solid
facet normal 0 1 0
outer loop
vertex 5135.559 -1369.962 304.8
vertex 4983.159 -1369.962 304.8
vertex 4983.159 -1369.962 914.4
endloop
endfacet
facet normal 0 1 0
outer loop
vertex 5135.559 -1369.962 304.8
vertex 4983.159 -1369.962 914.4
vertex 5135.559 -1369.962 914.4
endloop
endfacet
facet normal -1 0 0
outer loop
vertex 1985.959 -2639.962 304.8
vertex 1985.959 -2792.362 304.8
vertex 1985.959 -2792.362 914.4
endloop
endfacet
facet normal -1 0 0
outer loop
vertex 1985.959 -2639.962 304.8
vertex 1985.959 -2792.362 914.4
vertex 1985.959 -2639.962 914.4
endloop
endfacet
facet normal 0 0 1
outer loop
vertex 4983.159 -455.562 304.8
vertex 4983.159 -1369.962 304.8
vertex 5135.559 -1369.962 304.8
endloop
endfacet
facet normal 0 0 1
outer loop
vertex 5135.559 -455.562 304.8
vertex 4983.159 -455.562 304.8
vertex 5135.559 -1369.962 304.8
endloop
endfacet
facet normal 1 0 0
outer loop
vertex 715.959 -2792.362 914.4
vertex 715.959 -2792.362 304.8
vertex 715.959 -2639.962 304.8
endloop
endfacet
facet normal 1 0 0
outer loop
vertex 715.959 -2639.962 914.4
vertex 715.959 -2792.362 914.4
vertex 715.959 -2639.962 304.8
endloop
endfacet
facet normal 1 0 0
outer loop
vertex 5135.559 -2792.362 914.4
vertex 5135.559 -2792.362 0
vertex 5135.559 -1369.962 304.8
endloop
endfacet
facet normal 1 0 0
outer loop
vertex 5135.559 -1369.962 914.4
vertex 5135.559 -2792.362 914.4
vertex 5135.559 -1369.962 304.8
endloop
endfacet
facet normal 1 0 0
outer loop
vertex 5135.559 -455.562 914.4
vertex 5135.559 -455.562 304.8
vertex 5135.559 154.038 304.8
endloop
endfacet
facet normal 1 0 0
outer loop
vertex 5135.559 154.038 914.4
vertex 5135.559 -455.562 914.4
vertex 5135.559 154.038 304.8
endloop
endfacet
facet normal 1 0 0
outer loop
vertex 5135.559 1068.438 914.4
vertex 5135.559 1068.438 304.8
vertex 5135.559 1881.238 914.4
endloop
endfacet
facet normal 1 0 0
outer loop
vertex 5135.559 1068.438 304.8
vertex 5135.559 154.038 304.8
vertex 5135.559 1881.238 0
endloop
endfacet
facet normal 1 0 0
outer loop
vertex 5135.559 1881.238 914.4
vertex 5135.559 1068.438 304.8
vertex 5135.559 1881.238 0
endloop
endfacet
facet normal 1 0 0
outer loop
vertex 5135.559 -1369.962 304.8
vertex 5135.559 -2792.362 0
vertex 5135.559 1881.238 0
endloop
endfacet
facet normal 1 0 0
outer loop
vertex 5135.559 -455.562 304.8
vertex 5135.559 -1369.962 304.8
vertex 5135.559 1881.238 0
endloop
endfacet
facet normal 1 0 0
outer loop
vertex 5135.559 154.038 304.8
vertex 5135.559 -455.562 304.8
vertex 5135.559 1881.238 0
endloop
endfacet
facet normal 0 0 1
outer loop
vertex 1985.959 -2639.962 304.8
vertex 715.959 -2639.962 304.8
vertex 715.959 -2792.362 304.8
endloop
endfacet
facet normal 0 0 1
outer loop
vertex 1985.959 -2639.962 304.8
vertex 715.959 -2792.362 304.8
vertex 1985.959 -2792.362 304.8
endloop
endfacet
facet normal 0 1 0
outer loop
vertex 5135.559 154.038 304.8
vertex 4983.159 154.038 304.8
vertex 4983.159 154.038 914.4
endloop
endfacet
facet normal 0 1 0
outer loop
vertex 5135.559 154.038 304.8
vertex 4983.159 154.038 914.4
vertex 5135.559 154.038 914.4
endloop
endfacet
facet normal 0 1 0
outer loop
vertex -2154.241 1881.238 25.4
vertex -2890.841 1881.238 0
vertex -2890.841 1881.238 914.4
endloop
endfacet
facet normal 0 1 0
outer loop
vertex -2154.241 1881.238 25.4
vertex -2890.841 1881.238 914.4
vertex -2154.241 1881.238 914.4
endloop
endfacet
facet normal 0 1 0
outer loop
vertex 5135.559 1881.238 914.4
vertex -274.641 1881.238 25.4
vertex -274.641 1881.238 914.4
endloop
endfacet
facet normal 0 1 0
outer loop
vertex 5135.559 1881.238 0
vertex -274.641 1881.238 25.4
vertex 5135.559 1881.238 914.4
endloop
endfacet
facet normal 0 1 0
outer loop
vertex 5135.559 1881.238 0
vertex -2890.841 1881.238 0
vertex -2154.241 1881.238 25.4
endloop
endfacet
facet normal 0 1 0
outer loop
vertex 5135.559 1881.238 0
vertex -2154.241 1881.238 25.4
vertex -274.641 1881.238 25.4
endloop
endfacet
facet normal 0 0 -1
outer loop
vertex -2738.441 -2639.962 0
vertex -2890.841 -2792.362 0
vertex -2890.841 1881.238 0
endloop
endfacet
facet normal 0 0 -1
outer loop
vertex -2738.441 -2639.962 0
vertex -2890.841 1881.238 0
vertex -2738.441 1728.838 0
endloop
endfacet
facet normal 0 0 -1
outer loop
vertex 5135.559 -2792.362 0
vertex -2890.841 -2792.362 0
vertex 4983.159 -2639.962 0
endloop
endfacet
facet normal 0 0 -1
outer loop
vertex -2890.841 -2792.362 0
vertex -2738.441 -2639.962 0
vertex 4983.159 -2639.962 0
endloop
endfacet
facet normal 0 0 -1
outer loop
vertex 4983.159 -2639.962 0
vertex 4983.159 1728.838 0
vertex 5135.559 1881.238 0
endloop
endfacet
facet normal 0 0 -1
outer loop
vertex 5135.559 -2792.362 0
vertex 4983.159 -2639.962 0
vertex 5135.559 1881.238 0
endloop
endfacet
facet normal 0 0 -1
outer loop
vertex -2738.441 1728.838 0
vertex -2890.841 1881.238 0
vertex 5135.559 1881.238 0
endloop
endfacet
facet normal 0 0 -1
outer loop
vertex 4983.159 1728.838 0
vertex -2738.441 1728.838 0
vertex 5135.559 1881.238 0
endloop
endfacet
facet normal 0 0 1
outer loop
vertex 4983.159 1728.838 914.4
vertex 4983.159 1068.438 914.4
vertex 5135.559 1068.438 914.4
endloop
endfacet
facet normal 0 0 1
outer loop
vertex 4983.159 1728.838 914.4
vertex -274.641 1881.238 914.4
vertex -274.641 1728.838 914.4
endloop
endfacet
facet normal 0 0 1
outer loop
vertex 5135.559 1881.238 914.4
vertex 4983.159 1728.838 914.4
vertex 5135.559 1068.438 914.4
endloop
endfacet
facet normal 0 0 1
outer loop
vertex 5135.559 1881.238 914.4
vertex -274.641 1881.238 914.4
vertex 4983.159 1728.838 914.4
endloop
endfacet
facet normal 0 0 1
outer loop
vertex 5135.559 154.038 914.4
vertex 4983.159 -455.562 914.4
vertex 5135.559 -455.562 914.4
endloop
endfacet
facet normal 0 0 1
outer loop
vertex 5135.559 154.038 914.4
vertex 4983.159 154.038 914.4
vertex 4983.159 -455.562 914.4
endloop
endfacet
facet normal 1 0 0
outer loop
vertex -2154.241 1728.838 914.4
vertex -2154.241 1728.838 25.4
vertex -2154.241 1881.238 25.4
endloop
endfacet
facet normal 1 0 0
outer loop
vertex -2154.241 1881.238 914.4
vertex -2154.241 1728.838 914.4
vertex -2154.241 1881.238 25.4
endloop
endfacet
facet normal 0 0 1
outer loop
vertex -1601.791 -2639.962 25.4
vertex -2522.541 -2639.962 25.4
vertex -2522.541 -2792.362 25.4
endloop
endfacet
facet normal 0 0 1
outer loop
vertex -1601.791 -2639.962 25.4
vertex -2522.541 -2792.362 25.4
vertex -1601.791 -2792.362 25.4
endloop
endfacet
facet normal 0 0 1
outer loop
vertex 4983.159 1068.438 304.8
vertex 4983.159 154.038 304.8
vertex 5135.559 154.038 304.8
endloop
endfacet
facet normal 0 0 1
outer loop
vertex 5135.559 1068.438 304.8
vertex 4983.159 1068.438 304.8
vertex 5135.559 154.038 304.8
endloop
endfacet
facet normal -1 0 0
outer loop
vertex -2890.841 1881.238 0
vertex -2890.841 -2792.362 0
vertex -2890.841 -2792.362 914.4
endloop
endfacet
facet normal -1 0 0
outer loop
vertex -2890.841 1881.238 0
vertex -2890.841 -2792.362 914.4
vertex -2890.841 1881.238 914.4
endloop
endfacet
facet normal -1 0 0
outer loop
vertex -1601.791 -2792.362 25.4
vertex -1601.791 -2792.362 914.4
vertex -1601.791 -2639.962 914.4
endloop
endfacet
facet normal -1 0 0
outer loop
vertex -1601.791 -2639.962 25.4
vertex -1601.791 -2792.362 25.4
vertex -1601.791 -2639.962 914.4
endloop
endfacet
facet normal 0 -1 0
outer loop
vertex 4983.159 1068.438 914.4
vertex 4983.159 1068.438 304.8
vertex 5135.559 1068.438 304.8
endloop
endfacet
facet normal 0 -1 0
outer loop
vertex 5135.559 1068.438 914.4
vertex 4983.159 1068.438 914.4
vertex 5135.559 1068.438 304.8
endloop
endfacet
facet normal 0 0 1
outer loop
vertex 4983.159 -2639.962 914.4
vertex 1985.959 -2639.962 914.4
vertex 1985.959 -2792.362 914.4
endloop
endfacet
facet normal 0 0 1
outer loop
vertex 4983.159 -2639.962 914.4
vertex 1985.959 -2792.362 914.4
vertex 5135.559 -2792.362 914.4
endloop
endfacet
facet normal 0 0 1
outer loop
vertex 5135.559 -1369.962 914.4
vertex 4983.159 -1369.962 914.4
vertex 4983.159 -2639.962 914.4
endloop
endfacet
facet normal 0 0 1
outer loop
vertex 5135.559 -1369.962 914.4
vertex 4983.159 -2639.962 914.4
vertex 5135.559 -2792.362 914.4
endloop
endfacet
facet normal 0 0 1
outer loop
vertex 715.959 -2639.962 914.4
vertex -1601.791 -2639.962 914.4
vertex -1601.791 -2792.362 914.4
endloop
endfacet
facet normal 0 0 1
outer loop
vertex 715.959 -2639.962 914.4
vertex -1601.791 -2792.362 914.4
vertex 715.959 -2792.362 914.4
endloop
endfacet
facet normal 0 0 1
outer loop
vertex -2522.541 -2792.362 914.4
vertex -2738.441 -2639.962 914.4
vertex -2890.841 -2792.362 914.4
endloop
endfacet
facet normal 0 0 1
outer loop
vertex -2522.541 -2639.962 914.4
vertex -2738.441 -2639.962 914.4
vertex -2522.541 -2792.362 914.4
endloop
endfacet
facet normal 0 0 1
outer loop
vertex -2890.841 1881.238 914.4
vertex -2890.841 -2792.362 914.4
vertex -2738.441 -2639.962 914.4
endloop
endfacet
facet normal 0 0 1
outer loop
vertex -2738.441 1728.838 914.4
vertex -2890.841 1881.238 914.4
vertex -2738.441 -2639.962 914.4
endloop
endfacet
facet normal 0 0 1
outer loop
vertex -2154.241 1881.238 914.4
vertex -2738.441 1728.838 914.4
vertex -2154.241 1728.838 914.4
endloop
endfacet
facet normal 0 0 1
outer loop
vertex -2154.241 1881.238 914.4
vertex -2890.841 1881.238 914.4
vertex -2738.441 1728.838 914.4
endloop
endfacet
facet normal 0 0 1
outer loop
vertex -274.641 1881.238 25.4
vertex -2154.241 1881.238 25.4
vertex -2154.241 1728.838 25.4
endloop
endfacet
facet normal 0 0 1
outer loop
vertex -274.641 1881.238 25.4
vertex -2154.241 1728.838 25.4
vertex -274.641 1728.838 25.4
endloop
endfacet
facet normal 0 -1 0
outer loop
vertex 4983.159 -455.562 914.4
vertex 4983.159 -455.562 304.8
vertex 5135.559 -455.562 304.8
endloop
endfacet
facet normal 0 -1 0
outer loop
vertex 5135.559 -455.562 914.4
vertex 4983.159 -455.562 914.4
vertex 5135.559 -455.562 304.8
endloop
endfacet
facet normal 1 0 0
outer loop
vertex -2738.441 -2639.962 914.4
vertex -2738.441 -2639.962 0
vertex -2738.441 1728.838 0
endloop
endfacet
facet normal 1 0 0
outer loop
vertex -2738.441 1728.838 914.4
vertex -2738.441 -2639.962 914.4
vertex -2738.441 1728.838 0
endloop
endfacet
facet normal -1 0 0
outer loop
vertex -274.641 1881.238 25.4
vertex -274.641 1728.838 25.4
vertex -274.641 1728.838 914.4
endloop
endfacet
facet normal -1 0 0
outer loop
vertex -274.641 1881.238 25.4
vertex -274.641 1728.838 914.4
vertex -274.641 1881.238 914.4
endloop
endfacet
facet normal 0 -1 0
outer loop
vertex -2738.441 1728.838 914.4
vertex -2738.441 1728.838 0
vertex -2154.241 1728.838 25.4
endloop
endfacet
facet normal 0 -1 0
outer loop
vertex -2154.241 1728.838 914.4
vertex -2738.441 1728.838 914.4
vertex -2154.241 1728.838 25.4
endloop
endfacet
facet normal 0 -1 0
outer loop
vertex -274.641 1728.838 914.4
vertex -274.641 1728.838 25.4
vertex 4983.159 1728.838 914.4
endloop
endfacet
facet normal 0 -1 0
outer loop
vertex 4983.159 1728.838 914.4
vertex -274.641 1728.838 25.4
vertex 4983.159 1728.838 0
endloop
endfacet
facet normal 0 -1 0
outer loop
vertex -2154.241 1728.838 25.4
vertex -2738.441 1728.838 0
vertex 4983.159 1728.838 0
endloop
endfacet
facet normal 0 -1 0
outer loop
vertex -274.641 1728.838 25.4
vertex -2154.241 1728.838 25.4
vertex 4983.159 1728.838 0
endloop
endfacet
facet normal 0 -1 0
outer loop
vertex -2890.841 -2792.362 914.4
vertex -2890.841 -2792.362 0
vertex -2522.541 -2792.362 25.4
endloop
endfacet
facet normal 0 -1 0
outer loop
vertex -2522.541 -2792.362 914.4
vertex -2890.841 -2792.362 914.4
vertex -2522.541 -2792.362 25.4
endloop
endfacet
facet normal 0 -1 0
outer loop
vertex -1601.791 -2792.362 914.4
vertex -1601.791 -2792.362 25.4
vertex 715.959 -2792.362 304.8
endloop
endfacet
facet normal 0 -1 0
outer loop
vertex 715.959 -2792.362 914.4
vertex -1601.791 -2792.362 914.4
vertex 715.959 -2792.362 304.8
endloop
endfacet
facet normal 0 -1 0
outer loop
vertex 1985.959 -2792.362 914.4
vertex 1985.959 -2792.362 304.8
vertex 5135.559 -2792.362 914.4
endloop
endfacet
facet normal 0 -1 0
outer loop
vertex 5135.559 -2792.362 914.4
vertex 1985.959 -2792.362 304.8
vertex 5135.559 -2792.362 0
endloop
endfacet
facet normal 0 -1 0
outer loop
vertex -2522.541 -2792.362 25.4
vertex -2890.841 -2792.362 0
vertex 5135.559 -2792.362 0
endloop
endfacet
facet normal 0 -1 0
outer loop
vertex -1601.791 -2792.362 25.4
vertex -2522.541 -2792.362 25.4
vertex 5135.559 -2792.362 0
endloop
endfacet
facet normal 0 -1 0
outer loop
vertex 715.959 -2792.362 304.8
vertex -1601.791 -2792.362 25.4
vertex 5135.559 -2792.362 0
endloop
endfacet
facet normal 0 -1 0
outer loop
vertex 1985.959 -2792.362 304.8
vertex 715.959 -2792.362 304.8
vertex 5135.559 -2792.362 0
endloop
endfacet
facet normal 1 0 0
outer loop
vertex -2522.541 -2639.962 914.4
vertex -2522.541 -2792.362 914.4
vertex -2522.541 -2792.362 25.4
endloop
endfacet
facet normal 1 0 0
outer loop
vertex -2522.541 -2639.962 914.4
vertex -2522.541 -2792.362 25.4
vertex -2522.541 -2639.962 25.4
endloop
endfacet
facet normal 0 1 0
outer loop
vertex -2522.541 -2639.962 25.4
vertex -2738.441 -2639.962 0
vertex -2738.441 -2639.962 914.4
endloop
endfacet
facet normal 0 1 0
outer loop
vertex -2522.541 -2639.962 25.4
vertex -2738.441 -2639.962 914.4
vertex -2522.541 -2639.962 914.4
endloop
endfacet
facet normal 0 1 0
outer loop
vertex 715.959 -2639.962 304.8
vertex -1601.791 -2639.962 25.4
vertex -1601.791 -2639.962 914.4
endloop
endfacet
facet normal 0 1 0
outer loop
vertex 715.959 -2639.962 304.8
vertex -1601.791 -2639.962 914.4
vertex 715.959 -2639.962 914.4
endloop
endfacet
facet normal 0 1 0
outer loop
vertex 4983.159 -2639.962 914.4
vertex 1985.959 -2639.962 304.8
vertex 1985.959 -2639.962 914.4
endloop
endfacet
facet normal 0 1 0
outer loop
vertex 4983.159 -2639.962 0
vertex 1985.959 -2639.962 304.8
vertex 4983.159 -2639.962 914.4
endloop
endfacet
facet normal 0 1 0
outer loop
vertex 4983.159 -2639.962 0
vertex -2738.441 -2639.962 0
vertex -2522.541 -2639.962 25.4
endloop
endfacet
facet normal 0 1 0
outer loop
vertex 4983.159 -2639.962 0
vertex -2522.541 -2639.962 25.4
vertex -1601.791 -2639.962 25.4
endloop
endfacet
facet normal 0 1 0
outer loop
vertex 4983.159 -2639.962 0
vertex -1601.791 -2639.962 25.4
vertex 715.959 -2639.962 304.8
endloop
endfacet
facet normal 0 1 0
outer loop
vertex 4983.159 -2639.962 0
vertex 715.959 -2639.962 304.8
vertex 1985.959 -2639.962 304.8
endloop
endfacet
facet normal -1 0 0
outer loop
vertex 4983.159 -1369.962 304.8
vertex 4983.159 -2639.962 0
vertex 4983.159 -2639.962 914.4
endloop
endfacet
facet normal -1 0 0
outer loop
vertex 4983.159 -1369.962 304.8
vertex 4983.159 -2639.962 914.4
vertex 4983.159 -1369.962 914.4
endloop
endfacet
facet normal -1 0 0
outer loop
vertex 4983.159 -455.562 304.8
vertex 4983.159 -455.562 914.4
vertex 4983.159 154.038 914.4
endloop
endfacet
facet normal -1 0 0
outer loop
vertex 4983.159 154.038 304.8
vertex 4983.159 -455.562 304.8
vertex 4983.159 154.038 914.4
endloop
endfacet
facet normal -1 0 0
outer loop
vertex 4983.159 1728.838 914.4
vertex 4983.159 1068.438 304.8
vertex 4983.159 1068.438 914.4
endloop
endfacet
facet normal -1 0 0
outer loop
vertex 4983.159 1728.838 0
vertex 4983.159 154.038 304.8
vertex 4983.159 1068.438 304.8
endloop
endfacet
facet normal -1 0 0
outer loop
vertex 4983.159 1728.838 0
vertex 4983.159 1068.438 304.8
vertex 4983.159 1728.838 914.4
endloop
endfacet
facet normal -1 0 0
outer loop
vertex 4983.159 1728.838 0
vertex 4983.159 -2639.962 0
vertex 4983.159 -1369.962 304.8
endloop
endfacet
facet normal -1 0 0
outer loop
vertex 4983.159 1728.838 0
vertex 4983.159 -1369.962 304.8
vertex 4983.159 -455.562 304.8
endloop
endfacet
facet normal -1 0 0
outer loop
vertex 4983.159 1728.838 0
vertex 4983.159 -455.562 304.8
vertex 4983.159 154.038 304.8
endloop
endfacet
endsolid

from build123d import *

# Parameters (mm, degrees)
F0_W     = 8026.4
F0_H     = 4673.6
F0_W_2   = 7721.6
F0_H_2   = 4368.8
F1_DEPTH = 914.4
F2_W     = 920.75
F2_H     = 152.4
F2_W_2   = 1879.6
F3_DEPTH = 889
F4_W     = 1270
F4_H     = 152.4
F4_W_2   = 152.4
F4_H_2   = 914.4
F5_DEPTH = 609.6


with BuildPart() as f1:
    # F0 (on Top) → F1 (new body)
    with BuildSketch(Plane.XY):
        with Locations((1122.358516, -455.561714)):
            Rectangle(F0_W, F0_H)
        with Locations((1122.358516, -455.561714)):
            Rectangle(F0_W_2, F0_H_2, mode=Mode.SUBTRACT)
    extrude(amount=F1_DEPTH)

    # F2 (on face) → F3 (cut)
    with BuildSketch(Plane.XY.offset(914.4)):
        with Locations((-2062.166484, -2716.161714)):
            Rectangle(F2_W, F2_H)
        with Locations((-1214.441484, 1805.038286)):
            Rectangle(F2_W_2, F2_H)
    extrude(amount=-F3_DEPTH, mode=Mode.SUBTRACT)

    # F4 (on face) → F5 (cut)
    with BuildSketch(Plane.XY.offset(914.4)):
        with Locations((1350.958516, -2716.161714)):
            Rectangle(F4_W, F4_H)
        with Locations((5059.358516, -912.761714)):
            Rectangle(F4_W_2, F4_H_2)
        with Locations((5059.358516, 611.238286)):
            Rectangle(F4_W_2, F4_H_2)
    extrude(amount=-F5_DEPTH, mode=Mode.SUBTRACT)


solid = f1.part
